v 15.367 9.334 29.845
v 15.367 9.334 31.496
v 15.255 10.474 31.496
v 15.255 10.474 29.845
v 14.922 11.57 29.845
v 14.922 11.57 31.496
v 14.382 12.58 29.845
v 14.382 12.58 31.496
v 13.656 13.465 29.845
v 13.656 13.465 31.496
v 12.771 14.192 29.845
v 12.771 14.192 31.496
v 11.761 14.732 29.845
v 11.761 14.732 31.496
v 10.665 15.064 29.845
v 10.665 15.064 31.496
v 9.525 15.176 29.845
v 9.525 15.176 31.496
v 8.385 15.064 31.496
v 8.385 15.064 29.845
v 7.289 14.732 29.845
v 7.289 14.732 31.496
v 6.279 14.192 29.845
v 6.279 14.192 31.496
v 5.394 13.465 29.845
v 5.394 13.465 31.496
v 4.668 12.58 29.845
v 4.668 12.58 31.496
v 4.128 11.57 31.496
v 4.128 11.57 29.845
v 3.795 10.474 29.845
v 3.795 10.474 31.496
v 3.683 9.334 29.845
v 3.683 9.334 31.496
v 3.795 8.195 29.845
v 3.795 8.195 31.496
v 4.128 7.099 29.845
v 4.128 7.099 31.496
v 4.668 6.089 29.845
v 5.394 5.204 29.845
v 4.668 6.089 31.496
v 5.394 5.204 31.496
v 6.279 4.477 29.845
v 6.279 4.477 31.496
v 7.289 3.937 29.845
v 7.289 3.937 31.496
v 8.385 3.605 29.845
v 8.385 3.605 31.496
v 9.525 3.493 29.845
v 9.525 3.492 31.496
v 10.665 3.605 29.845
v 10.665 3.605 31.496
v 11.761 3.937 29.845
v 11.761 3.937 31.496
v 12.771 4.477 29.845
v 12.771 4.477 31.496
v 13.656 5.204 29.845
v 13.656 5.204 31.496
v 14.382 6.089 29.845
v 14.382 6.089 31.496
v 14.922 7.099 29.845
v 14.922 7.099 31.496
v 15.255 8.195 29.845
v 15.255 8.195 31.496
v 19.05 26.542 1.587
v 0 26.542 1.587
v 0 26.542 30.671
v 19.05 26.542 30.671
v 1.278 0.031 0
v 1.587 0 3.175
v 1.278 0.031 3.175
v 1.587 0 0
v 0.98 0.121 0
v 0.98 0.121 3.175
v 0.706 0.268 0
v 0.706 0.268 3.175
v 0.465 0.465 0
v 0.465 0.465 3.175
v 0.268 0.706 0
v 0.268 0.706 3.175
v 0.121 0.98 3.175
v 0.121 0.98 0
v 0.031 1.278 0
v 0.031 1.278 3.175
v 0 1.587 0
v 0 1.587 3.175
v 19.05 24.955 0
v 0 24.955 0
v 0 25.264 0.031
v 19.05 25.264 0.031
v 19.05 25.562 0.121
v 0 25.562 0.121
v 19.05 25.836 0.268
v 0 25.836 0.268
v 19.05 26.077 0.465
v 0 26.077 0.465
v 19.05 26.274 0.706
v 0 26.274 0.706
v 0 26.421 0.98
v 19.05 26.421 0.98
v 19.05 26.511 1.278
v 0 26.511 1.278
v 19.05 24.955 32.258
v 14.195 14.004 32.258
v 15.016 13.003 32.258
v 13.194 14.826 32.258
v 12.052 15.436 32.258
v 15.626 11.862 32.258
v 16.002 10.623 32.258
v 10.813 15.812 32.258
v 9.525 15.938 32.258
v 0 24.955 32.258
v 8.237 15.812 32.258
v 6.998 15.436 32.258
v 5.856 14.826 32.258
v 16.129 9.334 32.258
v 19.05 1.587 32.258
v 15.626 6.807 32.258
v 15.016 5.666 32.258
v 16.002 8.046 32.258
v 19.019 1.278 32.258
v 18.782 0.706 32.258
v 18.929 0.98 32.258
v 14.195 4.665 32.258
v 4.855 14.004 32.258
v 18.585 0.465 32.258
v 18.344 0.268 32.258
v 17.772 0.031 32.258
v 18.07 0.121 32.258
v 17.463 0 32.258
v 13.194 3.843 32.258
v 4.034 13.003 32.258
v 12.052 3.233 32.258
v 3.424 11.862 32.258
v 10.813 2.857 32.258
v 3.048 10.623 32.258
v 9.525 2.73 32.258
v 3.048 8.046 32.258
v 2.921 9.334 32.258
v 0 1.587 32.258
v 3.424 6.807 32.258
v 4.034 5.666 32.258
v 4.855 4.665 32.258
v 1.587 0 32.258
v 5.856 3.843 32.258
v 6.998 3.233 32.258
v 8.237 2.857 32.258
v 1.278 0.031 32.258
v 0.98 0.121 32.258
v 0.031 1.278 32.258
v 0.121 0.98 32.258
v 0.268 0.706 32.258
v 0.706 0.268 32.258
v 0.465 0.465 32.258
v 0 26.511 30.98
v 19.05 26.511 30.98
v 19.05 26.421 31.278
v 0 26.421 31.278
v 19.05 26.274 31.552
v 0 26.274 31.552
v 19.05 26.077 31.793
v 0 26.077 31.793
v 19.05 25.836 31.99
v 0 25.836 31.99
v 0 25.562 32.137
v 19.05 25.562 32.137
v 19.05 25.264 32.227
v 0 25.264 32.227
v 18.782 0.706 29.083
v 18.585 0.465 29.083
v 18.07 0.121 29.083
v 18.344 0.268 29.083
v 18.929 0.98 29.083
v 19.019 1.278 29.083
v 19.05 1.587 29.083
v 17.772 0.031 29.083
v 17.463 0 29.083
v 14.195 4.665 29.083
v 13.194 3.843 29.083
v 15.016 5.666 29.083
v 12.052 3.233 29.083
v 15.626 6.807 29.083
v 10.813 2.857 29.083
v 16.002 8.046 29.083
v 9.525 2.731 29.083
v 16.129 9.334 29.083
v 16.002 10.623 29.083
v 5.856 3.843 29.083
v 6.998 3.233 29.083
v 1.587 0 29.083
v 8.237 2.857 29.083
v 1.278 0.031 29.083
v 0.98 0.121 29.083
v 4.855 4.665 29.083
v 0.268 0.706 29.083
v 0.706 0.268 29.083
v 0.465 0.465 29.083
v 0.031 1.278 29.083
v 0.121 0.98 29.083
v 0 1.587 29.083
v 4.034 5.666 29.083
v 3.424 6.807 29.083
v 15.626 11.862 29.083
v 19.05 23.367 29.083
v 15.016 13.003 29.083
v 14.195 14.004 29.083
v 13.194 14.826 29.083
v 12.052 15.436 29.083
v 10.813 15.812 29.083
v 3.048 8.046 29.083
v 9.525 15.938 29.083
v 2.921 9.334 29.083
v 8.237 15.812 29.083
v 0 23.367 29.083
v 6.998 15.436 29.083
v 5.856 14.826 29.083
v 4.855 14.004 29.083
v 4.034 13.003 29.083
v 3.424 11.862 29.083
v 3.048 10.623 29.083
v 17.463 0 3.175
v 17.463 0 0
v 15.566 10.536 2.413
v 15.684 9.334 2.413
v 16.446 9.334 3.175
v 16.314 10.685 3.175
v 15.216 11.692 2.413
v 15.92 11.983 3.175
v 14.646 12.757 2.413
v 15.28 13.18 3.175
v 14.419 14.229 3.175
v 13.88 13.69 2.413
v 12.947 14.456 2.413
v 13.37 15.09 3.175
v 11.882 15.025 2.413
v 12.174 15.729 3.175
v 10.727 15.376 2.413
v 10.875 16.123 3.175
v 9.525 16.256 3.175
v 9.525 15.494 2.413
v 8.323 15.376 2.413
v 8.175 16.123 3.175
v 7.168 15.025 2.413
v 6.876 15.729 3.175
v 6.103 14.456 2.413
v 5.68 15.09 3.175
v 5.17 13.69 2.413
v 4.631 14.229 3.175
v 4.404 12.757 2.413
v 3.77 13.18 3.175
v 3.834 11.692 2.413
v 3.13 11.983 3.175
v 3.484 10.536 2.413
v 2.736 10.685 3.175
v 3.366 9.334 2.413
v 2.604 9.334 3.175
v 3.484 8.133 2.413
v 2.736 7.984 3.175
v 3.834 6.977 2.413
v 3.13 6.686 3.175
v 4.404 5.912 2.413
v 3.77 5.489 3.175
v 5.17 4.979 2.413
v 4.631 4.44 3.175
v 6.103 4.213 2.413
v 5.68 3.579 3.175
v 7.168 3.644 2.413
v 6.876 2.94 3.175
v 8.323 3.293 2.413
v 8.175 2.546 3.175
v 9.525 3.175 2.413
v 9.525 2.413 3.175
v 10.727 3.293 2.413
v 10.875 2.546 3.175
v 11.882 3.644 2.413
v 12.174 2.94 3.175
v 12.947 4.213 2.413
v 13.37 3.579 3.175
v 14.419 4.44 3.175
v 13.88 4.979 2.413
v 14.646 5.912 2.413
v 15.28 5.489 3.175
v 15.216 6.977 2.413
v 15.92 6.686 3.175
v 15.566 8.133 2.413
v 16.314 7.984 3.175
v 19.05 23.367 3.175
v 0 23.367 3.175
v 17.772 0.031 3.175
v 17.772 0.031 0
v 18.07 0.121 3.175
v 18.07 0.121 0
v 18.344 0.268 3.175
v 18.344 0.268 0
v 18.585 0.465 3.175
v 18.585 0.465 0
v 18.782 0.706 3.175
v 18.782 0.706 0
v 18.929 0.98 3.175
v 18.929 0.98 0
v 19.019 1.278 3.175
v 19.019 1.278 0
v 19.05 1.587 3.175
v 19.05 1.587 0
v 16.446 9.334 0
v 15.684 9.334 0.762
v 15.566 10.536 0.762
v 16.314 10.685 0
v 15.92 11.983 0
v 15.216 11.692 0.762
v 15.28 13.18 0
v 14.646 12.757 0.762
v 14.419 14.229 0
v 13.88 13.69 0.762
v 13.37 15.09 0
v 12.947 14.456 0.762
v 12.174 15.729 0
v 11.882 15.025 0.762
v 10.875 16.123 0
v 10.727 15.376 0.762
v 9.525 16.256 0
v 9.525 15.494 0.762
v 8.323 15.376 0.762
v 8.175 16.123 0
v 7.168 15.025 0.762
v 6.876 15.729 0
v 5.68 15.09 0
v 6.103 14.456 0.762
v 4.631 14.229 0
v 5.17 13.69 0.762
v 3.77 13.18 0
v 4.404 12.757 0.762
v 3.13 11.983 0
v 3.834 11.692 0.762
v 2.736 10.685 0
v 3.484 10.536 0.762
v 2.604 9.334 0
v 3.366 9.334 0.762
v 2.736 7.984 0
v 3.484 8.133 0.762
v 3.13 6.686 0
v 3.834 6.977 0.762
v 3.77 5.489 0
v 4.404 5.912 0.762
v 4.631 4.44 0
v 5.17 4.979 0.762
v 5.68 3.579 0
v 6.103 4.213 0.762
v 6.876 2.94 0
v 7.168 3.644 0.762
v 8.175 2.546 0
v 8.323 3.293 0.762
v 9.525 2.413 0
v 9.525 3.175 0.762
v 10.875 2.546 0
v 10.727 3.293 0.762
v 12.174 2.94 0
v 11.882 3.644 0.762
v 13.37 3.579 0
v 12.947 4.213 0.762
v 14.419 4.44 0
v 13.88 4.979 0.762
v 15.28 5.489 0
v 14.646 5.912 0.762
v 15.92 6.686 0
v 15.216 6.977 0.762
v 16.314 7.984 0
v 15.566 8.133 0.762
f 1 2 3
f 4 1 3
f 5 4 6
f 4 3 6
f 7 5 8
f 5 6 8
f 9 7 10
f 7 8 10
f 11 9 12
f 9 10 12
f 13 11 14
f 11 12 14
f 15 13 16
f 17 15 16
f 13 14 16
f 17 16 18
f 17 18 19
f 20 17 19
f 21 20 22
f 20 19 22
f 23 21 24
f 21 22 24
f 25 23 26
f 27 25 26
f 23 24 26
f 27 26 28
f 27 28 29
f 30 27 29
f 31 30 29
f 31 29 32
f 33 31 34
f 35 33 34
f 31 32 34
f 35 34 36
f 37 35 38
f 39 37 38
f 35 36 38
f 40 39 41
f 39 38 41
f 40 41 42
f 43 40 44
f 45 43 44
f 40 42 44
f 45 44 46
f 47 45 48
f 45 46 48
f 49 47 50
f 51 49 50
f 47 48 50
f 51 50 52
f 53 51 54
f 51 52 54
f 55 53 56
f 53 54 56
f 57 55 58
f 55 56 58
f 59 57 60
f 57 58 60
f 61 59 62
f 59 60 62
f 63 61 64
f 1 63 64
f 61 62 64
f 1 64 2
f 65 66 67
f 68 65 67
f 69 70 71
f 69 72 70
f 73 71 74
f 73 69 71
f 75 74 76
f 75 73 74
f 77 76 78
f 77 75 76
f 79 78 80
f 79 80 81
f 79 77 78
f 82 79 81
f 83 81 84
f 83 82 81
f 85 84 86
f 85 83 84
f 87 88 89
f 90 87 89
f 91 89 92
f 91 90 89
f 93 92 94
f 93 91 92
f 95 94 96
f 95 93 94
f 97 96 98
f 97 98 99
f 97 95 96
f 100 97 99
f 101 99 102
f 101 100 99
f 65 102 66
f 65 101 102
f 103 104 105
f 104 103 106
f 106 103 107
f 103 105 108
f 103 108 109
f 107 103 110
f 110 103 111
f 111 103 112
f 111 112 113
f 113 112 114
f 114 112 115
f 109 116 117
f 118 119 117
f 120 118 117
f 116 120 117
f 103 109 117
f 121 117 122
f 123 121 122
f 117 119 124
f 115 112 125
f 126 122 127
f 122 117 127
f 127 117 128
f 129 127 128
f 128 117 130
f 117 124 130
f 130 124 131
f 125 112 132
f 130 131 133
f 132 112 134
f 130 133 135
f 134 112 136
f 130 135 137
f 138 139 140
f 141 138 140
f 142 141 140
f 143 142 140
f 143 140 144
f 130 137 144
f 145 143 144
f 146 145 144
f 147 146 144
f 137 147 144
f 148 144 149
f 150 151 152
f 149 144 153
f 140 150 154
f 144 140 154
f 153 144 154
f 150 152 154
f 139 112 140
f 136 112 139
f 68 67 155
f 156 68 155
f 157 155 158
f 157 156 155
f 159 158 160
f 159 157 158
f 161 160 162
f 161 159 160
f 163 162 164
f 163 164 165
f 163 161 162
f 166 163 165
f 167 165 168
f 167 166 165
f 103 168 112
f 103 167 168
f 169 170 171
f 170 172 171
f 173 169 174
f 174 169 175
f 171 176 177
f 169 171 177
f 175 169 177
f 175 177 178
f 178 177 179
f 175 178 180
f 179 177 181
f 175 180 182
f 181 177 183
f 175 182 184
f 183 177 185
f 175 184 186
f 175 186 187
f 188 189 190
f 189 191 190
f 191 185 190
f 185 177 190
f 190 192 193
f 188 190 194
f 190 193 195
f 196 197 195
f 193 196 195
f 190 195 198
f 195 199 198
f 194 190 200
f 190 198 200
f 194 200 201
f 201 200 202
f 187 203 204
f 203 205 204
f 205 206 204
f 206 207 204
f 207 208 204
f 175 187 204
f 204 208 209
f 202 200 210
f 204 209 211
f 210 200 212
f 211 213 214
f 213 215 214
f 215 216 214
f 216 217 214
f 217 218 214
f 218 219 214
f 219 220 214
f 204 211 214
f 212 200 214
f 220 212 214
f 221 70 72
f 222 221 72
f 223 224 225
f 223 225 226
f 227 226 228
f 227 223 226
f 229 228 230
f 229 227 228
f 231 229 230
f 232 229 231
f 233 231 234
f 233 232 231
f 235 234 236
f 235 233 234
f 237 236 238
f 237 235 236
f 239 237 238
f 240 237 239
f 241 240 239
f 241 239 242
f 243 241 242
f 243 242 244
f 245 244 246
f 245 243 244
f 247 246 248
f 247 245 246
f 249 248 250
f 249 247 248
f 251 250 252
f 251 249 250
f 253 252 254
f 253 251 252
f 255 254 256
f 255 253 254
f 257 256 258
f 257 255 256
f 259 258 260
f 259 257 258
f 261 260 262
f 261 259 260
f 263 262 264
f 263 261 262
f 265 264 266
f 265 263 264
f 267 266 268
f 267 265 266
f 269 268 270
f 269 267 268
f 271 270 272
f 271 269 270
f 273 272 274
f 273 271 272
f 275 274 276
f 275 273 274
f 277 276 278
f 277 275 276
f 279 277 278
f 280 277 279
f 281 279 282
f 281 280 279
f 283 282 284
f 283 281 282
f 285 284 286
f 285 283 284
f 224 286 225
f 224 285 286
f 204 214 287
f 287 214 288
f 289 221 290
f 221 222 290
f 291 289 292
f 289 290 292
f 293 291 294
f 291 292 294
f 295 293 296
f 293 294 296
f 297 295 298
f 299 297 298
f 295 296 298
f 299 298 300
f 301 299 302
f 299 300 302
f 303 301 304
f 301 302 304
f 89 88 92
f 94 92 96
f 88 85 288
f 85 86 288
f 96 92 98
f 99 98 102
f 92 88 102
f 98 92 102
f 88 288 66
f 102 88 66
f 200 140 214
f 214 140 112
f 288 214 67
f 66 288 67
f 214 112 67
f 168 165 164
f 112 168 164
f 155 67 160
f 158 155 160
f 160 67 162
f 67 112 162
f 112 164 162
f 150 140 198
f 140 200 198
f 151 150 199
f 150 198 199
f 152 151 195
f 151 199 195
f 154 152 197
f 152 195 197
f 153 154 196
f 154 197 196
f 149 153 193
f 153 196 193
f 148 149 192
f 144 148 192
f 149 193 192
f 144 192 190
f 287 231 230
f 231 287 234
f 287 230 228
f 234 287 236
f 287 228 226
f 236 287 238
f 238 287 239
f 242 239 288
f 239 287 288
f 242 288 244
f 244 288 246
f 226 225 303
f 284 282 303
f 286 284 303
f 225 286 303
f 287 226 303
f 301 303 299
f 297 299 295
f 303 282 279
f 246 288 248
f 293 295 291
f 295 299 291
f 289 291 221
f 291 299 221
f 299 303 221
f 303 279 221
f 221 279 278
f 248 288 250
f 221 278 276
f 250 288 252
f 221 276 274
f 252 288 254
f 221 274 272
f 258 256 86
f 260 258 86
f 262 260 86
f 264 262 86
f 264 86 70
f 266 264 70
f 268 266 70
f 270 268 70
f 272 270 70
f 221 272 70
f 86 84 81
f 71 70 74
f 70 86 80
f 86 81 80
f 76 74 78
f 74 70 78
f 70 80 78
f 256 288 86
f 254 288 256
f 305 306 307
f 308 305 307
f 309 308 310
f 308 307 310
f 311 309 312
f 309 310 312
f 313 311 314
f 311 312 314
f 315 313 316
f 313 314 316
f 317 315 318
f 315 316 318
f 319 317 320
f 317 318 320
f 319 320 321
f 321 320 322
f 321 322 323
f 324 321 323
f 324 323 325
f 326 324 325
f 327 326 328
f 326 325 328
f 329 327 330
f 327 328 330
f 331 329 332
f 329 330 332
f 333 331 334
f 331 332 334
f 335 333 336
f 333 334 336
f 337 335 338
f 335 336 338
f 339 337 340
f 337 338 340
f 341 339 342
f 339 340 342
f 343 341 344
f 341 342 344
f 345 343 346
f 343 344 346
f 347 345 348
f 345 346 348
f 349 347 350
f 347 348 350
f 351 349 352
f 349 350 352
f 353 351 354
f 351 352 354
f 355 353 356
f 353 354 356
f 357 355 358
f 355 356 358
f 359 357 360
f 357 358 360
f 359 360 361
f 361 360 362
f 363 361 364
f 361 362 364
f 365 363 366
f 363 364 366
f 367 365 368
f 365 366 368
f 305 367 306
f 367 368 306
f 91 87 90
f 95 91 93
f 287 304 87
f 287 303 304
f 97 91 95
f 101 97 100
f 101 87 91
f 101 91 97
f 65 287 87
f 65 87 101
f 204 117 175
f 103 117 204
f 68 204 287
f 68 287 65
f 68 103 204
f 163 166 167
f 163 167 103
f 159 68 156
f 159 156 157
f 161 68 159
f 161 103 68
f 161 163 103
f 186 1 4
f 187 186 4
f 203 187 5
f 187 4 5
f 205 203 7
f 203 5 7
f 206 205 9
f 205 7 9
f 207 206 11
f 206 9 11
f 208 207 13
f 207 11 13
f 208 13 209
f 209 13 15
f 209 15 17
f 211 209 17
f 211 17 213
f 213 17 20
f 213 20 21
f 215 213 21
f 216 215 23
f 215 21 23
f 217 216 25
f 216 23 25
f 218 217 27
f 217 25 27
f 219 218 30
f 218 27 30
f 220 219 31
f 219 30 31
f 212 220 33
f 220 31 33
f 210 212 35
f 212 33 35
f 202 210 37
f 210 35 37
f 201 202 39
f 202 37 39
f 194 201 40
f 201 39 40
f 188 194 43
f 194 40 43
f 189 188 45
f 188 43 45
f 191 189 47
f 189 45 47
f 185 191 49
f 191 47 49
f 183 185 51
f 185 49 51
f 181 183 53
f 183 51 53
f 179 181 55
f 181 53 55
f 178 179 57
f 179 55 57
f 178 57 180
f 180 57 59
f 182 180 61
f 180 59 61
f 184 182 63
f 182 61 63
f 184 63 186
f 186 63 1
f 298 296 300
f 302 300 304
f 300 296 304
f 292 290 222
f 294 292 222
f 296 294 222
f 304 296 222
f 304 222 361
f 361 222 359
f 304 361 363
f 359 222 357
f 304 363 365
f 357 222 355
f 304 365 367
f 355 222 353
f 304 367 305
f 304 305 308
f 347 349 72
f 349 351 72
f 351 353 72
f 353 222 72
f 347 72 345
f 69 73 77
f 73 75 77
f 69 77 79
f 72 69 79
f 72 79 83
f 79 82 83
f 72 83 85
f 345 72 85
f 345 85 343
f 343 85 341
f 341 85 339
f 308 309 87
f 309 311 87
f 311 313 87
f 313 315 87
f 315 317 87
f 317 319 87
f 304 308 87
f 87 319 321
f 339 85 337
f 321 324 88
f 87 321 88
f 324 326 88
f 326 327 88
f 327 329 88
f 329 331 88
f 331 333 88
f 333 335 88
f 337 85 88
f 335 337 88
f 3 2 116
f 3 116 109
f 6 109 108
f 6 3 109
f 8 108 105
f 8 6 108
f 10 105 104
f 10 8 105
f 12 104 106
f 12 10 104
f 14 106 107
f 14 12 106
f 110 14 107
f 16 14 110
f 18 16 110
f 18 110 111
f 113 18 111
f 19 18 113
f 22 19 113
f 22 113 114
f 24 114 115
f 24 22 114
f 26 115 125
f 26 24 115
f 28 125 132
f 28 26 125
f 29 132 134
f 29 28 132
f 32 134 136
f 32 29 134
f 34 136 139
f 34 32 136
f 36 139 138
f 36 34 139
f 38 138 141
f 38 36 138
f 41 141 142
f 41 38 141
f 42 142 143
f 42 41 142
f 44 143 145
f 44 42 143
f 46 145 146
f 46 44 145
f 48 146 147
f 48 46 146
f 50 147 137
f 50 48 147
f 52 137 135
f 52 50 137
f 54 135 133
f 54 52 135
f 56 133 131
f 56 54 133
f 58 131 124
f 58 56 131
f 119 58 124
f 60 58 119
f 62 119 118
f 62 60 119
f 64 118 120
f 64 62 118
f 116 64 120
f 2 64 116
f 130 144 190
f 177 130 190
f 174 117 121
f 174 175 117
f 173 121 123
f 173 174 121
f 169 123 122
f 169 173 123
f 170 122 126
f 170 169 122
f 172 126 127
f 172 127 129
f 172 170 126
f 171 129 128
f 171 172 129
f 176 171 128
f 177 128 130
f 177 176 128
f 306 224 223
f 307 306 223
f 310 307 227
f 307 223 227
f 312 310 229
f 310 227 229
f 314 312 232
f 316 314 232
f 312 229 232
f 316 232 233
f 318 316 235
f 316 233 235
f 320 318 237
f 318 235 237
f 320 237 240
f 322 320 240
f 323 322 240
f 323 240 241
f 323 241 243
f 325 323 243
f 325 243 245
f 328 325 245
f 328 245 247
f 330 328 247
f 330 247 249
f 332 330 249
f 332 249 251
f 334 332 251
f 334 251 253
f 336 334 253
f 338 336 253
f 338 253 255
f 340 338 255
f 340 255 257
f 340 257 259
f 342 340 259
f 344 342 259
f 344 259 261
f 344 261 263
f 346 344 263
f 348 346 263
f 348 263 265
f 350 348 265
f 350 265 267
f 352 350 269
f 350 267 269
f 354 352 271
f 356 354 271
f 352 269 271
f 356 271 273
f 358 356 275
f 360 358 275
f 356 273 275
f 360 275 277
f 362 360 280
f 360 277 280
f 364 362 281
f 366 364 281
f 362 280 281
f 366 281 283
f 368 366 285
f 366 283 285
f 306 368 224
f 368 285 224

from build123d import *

# Parameters (mm, degrees)
F1_DEPTH = 19.05
F2_R     = 6.1595
F3_DEPTH = 25.4
F4_R     = 5.842
F5_DEPTH = 3.175
F6_R     = 1.5875
F7_SIZE  = 0.762


with BuildPart() as f1:
    # F0 (on Right) → F1 (new body)
    with BuildSketch(Plane.YZ):
        Polygon((0, 3.175), (0, 0), (26.542, 0), (26.542, 32.258), (0, 32.258), (0, 29.083), (23.367, 29.083), (23.367, 3.175), align=None)
    extrude(amount=F1_DEPTH)

    # F2 (on face) → F3 (cut)
    with BuildSketch(Plane.XY.offset(3.175)):
        with Locations((9.525, 9.3345)):
            Circle(F2_R)
    extrude(amount=-F3_DEPTH, mode=Mode.SUBTRACT)

    # F4 (on face) → F5 (cut, through all)
    with BuildSketch(Plane.XY.offset(32.258)):
        with Locations((9.525, 9.3345)):
            Circle(F4_R)
    extrude(amount=-F5_DEPTH, mode=Mode.SUBTRACT)

    # F6
    f6_edges = [f1.edges().sort_by_distance(p)[0] for p in [
        (19.05, 0, 30.6705),
        (0, 0, 30.6705),
        (0, 0, 1.5875),
        (19.05, 0, 1.5875),
        (9.525, 26.542, 32.258),
        (9.525, 26.542, 0),
    ]]
    fillet(f6_edges, radius=F6_R)

    # F7
    f7_edges = [f1.edges().sort_by_distance(p)[0] for p in [
        (3.3655, 9.3345, 0),
        (3.683, 9.3345, 29.083),
        (3.683, 9.3345, 32.258),
        (3.3655, 9.3345, 3.175),
    ]]
    chamfer(f7_edges, length=F7_SIZE)


solid = f1.part
